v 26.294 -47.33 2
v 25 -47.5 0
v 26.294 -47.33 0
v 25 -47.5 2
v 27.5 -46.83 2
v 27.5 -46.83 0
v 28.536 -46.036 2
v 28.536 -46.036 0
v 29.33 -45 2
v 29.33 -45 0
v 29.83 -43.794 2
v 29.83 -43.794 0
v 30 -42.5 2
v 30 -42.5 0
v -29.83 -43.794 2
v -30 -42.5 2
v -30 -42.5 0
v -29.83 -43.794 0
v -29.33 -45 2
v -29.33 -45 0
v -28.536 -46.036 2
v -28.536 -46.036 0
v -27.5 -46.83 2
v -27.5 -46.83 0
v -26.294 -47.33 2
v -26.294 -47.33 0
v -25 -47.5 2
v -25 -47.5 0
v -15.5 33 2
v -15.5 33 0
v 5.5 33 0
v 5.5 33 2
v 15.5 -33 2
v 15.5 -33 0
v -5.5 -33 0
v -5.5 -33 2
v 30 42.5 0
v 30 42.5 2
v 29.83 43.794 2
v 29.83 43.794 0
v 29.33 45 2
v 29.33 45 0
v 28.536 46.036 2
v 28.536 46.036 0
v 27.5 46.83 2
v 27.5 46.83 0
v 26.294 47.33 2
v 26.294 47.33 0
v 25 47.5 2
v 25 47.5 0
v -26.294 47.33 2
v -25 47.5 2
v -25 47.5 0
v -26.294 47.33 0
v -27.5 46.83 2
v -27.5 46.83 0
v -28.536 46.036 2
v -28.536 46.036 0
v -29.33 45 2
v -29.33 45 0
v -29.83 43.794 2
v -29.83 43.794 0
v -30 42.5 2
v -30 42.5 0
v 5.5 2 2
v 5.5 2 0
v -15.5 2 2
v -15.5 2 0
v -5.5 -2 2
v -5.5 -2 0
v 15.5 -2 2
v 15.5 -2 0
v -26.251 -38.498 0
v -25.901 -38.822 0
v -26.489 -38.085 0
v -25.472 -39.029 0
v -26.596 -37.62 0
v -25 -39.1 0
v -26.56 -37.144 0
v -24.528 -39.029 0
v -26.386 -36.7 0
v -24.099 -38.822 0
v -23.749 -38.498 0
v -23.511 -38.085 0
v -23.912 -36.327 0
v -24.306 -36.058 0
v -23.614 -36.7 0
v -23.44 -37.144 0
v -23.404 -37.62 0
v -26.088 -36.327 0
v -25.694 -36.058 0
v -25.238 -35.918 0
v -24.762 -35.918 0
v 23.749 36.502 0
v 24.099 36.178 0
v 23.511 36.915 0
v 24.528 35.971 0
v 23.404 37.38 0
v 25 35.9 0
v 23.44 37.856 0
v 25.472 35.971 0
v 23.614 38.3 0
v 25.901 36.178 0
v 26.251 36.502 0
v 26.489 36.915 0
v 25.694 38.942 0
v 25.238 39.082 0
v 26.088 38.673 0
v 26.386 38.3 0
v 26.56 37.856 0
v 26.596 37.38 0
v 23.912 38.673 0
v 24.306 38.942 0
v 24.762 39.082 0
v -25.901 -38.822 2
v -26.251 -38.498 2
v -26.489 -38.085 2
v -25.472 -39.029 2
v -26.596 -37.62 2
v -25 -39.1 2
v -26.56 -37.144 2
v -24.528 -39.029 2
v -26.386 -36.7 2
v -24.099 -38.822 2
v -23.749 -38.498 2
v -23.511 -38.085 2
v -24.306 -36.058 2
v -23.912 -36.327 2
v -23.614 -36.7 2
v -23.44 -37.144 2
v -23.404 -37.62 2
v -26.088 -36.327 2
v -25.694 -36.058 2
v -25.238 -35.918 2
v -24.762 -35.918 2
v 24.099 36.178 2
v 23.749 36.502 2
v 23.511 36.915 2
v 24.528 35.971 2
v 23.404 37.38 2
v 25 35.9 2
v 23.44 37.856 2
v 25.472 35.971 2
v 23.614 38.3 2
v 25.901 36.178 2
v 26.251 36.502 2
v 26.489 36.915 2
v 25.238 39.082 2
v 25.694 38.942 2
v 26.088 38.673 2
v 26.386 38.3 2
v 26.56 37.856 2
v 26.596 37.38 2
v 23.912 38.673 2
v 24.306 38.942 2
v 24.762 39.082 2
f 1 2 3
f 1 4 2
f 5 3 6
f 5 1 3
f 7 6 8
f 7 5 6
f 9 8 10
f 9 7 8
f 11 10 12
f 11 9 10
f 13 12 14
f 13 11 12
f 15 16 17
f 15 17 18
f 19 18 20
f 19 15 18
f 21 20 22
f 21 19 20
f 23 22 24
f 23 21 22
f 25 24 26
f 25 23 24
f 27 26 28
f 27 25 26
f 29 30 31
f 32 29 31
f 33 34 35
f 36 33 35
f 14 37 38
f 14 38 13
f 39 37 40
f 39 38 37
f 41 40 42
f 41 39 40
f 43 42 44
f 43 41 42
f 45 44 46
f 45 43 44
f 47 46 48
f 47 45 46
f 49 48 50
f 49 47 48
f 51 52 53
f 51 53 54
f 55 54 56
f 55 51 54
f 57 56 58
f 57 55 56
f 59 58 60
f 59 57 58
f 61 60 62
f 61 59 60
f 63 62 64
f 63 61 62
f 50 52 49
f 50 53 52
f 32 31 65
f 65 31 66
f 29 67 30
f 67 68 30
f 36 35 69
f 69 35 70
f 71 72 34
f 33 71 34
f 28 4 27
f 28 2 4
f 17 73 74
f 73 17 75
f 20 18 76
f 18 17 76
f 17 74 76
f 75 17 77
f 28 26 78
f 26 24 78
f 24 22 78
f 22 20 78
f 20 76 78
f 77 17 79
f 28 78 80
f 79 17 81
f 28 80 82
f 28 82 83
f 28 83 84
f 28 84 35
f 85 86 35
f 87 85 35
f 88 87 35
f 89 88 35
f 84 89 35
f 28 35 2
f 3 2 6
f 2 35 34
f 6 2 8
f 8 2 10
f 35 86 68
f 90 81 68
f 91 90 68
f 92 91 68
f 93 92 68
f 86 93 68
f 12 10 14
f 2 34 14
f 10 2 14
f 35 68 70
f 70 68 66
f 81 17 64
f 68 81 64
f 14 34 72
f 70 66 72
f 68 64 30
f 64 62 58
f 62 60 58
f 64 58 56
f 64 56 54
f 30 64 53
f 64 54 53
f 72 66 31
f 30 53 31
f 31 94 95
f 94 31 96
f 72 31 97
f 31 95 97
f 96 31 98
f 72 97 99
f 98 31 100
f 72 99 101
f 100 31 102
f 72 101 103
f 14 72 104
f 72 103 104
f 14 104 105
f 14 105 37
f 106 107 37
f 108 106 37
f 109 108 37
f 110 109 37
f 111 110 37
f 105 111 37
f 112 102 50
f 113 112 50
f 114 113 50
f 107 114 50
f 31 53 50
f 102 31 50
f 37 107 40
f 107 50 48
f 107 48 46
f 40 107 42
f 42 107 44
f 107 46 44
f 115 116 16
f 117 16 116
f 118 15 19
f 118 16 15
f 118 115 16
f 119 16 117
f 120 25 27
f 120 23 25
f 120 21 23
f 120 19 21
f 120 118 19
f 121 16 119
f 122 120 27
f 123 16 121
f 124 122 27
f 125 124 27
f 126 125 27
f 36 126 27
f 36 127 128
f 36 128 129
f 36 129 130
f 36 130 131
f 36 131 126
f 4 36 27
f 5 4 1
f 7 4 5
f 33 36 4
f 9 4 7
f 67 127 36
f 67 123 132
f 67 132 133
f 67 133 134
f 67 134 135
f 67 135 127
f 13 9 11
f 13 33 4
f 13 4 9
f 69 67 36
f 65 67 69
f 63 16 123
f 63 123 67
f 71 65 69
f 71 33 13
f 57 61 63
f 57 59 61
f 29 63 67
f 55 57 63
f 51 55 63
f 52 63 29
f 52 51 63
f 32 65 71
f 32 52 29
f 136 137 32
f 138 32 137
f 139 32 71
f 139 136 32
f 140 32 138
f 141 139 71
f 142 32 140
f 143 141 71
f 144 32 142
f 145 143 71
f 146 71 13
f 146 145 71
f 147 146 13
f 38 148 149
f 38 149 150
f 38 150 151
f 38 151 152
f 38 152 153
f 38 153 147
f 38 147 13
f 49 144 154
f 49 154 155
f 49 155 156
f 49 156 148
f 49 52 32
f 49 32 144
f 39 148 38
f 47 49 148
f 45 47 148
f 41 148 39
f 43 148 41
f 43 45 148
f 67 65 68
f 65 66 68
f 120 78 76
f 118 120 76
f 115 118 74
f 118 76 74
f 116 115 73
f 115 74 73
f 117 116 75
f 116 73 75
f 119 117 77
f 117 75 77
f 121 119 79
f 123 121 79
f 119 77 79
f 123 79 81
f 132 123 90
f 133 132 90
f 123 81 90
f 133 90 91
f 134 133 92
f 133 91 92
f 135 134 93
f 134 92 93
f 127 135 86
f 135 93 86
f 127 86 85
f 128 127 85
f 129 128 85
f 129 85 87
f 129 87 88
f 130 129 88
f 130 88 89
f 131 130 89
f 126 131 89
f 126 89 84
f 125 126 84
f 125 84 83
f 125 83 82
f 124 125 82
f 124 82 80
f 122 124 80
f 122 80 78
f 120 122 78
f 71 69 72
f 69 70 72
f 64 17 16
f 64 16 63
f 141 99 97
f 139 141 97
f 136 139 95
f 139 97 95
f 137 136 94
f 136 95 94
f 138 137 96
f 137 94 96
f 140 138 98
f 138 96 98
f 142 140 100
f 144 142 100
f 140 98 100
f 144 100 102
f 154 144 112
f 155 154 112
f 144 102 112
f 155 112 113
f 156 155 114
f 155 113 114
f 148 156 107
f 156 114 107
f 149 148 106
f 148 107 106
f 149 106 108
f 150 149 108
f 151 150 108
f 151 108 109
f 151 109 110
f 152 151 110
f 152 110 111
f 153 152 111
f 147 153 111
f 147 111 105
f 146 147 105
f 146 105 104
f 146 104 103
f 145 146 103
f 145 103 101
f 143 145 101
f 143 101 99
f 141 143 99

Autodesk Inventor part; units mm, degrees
ref_plane "YZ Plane" through (0, 0, 0) normal (1, 0, 0) x (0, 1, 0)
ref_plane "XZ Plane" through (0, 0, 0) normal (0, 1, 0) x (-1, 0, 0)
ref_plane "XY Plane" through (0, 0, 0) normal (0, 0, 1) x (1, 0, 0)
sketch "Sketch1" plane through (0, 0, 0) normal (0, 0, 1) x (1, 0, 0)
  line L0 (0, 66.5) -> (0, -66.5) construction
  line L1 (-42, 0) -> (42, 0) construction
  line L2 (30, -47.5) -> (-30, -47.5)
  line L3 (-30, -47.5) -> (-30, 47.5)
  line L4 (-30, 47.5) -> (30, 47.5)
  line L5 (30, 47.5) -> (30, -47.5)
  line L6 (30, -47.5) -> (-30, 47.5) construction
  line L7 (-30, -47.5) -> (30, 47.5) construction
  line L8 (5.5, 2) -> (-15.5, 2)
  line L9 (-15.5, 2) -> (-15.5, 33)
  line L10 (-15.5, 33) -> (5.5, 33)
  line L11 (5.5, 33) -> (5.5, 2)
  line L12 (5.5, 2) -> (-15.5, 33) construction
  line L13 (-15.5, 2) -> (5.5, 33) construction
  line L14 (15.5, -33) -> (-5.5, -33)
  line L15 (-5.5, -33) -> (-5.5, -2)
  line L16 (-5.5, -2) -> (15.5, -2)
  line L17 (15.5, -2) -> (15.5, -33)
  line L18 (15.5, -33) -> (-5.5, -2) construction
  line L19 (-5.5, -33) -> (15.5, -2) construction
  point P0 (0, 0)
  point P1 (-5, 17.5)
  point P2 (5, -17.5)
  dimension "d13" = 95
  dimension "d14" = 60
  dimension "d15" = 31
  dimension "d16" = 21
  dimension "d17" = 5
  dimension "d18" = 17.5
  dimension "d19" = 17.5
  dimension "d20" = 5
extrude "Extrusion3" add sketch "Sketch1" along normal blind 2
sketch "Sketch2" plane through (0, 0, 2) normal (0, 0, 1) x (1, 0, 0)
  line L0 (25, -37.5) -> (-25, -37.5) construction
  line L1 (-25, -37.5) -> (-25, 37.5) construction
  line L2 (-25, 37.5) -> (25, 37.5) construction
  line L3 (25, 37.5) -> (25, -37.5) construction
  line L4 (25, -37.5) -> (-25, 37.5) construction
  line L5 (-25, -37.5) -> (25, 37.5) construction
  point P0 (0, 0)
  point P1 (-25, -37.5)
  dimension "d21" = 75
  dimension "d22" = 50
hole "Hole1" at (25, 37.5, 2) at (-25, -37.5, 2) direction (0, 0, -1) diameter 3.2 end through all
fillet "Fillet1" radius 5 4 edges at (30, 47.5, 1) (-30, 47.5, 1) (30, -47.5, 1) (-30, -47.5, 1)
equation "\"d19\" = d18"
equation "\"d20\" = d17"
properties part number "17-0028-0112" material "Plastic (perspex PMMA)"
